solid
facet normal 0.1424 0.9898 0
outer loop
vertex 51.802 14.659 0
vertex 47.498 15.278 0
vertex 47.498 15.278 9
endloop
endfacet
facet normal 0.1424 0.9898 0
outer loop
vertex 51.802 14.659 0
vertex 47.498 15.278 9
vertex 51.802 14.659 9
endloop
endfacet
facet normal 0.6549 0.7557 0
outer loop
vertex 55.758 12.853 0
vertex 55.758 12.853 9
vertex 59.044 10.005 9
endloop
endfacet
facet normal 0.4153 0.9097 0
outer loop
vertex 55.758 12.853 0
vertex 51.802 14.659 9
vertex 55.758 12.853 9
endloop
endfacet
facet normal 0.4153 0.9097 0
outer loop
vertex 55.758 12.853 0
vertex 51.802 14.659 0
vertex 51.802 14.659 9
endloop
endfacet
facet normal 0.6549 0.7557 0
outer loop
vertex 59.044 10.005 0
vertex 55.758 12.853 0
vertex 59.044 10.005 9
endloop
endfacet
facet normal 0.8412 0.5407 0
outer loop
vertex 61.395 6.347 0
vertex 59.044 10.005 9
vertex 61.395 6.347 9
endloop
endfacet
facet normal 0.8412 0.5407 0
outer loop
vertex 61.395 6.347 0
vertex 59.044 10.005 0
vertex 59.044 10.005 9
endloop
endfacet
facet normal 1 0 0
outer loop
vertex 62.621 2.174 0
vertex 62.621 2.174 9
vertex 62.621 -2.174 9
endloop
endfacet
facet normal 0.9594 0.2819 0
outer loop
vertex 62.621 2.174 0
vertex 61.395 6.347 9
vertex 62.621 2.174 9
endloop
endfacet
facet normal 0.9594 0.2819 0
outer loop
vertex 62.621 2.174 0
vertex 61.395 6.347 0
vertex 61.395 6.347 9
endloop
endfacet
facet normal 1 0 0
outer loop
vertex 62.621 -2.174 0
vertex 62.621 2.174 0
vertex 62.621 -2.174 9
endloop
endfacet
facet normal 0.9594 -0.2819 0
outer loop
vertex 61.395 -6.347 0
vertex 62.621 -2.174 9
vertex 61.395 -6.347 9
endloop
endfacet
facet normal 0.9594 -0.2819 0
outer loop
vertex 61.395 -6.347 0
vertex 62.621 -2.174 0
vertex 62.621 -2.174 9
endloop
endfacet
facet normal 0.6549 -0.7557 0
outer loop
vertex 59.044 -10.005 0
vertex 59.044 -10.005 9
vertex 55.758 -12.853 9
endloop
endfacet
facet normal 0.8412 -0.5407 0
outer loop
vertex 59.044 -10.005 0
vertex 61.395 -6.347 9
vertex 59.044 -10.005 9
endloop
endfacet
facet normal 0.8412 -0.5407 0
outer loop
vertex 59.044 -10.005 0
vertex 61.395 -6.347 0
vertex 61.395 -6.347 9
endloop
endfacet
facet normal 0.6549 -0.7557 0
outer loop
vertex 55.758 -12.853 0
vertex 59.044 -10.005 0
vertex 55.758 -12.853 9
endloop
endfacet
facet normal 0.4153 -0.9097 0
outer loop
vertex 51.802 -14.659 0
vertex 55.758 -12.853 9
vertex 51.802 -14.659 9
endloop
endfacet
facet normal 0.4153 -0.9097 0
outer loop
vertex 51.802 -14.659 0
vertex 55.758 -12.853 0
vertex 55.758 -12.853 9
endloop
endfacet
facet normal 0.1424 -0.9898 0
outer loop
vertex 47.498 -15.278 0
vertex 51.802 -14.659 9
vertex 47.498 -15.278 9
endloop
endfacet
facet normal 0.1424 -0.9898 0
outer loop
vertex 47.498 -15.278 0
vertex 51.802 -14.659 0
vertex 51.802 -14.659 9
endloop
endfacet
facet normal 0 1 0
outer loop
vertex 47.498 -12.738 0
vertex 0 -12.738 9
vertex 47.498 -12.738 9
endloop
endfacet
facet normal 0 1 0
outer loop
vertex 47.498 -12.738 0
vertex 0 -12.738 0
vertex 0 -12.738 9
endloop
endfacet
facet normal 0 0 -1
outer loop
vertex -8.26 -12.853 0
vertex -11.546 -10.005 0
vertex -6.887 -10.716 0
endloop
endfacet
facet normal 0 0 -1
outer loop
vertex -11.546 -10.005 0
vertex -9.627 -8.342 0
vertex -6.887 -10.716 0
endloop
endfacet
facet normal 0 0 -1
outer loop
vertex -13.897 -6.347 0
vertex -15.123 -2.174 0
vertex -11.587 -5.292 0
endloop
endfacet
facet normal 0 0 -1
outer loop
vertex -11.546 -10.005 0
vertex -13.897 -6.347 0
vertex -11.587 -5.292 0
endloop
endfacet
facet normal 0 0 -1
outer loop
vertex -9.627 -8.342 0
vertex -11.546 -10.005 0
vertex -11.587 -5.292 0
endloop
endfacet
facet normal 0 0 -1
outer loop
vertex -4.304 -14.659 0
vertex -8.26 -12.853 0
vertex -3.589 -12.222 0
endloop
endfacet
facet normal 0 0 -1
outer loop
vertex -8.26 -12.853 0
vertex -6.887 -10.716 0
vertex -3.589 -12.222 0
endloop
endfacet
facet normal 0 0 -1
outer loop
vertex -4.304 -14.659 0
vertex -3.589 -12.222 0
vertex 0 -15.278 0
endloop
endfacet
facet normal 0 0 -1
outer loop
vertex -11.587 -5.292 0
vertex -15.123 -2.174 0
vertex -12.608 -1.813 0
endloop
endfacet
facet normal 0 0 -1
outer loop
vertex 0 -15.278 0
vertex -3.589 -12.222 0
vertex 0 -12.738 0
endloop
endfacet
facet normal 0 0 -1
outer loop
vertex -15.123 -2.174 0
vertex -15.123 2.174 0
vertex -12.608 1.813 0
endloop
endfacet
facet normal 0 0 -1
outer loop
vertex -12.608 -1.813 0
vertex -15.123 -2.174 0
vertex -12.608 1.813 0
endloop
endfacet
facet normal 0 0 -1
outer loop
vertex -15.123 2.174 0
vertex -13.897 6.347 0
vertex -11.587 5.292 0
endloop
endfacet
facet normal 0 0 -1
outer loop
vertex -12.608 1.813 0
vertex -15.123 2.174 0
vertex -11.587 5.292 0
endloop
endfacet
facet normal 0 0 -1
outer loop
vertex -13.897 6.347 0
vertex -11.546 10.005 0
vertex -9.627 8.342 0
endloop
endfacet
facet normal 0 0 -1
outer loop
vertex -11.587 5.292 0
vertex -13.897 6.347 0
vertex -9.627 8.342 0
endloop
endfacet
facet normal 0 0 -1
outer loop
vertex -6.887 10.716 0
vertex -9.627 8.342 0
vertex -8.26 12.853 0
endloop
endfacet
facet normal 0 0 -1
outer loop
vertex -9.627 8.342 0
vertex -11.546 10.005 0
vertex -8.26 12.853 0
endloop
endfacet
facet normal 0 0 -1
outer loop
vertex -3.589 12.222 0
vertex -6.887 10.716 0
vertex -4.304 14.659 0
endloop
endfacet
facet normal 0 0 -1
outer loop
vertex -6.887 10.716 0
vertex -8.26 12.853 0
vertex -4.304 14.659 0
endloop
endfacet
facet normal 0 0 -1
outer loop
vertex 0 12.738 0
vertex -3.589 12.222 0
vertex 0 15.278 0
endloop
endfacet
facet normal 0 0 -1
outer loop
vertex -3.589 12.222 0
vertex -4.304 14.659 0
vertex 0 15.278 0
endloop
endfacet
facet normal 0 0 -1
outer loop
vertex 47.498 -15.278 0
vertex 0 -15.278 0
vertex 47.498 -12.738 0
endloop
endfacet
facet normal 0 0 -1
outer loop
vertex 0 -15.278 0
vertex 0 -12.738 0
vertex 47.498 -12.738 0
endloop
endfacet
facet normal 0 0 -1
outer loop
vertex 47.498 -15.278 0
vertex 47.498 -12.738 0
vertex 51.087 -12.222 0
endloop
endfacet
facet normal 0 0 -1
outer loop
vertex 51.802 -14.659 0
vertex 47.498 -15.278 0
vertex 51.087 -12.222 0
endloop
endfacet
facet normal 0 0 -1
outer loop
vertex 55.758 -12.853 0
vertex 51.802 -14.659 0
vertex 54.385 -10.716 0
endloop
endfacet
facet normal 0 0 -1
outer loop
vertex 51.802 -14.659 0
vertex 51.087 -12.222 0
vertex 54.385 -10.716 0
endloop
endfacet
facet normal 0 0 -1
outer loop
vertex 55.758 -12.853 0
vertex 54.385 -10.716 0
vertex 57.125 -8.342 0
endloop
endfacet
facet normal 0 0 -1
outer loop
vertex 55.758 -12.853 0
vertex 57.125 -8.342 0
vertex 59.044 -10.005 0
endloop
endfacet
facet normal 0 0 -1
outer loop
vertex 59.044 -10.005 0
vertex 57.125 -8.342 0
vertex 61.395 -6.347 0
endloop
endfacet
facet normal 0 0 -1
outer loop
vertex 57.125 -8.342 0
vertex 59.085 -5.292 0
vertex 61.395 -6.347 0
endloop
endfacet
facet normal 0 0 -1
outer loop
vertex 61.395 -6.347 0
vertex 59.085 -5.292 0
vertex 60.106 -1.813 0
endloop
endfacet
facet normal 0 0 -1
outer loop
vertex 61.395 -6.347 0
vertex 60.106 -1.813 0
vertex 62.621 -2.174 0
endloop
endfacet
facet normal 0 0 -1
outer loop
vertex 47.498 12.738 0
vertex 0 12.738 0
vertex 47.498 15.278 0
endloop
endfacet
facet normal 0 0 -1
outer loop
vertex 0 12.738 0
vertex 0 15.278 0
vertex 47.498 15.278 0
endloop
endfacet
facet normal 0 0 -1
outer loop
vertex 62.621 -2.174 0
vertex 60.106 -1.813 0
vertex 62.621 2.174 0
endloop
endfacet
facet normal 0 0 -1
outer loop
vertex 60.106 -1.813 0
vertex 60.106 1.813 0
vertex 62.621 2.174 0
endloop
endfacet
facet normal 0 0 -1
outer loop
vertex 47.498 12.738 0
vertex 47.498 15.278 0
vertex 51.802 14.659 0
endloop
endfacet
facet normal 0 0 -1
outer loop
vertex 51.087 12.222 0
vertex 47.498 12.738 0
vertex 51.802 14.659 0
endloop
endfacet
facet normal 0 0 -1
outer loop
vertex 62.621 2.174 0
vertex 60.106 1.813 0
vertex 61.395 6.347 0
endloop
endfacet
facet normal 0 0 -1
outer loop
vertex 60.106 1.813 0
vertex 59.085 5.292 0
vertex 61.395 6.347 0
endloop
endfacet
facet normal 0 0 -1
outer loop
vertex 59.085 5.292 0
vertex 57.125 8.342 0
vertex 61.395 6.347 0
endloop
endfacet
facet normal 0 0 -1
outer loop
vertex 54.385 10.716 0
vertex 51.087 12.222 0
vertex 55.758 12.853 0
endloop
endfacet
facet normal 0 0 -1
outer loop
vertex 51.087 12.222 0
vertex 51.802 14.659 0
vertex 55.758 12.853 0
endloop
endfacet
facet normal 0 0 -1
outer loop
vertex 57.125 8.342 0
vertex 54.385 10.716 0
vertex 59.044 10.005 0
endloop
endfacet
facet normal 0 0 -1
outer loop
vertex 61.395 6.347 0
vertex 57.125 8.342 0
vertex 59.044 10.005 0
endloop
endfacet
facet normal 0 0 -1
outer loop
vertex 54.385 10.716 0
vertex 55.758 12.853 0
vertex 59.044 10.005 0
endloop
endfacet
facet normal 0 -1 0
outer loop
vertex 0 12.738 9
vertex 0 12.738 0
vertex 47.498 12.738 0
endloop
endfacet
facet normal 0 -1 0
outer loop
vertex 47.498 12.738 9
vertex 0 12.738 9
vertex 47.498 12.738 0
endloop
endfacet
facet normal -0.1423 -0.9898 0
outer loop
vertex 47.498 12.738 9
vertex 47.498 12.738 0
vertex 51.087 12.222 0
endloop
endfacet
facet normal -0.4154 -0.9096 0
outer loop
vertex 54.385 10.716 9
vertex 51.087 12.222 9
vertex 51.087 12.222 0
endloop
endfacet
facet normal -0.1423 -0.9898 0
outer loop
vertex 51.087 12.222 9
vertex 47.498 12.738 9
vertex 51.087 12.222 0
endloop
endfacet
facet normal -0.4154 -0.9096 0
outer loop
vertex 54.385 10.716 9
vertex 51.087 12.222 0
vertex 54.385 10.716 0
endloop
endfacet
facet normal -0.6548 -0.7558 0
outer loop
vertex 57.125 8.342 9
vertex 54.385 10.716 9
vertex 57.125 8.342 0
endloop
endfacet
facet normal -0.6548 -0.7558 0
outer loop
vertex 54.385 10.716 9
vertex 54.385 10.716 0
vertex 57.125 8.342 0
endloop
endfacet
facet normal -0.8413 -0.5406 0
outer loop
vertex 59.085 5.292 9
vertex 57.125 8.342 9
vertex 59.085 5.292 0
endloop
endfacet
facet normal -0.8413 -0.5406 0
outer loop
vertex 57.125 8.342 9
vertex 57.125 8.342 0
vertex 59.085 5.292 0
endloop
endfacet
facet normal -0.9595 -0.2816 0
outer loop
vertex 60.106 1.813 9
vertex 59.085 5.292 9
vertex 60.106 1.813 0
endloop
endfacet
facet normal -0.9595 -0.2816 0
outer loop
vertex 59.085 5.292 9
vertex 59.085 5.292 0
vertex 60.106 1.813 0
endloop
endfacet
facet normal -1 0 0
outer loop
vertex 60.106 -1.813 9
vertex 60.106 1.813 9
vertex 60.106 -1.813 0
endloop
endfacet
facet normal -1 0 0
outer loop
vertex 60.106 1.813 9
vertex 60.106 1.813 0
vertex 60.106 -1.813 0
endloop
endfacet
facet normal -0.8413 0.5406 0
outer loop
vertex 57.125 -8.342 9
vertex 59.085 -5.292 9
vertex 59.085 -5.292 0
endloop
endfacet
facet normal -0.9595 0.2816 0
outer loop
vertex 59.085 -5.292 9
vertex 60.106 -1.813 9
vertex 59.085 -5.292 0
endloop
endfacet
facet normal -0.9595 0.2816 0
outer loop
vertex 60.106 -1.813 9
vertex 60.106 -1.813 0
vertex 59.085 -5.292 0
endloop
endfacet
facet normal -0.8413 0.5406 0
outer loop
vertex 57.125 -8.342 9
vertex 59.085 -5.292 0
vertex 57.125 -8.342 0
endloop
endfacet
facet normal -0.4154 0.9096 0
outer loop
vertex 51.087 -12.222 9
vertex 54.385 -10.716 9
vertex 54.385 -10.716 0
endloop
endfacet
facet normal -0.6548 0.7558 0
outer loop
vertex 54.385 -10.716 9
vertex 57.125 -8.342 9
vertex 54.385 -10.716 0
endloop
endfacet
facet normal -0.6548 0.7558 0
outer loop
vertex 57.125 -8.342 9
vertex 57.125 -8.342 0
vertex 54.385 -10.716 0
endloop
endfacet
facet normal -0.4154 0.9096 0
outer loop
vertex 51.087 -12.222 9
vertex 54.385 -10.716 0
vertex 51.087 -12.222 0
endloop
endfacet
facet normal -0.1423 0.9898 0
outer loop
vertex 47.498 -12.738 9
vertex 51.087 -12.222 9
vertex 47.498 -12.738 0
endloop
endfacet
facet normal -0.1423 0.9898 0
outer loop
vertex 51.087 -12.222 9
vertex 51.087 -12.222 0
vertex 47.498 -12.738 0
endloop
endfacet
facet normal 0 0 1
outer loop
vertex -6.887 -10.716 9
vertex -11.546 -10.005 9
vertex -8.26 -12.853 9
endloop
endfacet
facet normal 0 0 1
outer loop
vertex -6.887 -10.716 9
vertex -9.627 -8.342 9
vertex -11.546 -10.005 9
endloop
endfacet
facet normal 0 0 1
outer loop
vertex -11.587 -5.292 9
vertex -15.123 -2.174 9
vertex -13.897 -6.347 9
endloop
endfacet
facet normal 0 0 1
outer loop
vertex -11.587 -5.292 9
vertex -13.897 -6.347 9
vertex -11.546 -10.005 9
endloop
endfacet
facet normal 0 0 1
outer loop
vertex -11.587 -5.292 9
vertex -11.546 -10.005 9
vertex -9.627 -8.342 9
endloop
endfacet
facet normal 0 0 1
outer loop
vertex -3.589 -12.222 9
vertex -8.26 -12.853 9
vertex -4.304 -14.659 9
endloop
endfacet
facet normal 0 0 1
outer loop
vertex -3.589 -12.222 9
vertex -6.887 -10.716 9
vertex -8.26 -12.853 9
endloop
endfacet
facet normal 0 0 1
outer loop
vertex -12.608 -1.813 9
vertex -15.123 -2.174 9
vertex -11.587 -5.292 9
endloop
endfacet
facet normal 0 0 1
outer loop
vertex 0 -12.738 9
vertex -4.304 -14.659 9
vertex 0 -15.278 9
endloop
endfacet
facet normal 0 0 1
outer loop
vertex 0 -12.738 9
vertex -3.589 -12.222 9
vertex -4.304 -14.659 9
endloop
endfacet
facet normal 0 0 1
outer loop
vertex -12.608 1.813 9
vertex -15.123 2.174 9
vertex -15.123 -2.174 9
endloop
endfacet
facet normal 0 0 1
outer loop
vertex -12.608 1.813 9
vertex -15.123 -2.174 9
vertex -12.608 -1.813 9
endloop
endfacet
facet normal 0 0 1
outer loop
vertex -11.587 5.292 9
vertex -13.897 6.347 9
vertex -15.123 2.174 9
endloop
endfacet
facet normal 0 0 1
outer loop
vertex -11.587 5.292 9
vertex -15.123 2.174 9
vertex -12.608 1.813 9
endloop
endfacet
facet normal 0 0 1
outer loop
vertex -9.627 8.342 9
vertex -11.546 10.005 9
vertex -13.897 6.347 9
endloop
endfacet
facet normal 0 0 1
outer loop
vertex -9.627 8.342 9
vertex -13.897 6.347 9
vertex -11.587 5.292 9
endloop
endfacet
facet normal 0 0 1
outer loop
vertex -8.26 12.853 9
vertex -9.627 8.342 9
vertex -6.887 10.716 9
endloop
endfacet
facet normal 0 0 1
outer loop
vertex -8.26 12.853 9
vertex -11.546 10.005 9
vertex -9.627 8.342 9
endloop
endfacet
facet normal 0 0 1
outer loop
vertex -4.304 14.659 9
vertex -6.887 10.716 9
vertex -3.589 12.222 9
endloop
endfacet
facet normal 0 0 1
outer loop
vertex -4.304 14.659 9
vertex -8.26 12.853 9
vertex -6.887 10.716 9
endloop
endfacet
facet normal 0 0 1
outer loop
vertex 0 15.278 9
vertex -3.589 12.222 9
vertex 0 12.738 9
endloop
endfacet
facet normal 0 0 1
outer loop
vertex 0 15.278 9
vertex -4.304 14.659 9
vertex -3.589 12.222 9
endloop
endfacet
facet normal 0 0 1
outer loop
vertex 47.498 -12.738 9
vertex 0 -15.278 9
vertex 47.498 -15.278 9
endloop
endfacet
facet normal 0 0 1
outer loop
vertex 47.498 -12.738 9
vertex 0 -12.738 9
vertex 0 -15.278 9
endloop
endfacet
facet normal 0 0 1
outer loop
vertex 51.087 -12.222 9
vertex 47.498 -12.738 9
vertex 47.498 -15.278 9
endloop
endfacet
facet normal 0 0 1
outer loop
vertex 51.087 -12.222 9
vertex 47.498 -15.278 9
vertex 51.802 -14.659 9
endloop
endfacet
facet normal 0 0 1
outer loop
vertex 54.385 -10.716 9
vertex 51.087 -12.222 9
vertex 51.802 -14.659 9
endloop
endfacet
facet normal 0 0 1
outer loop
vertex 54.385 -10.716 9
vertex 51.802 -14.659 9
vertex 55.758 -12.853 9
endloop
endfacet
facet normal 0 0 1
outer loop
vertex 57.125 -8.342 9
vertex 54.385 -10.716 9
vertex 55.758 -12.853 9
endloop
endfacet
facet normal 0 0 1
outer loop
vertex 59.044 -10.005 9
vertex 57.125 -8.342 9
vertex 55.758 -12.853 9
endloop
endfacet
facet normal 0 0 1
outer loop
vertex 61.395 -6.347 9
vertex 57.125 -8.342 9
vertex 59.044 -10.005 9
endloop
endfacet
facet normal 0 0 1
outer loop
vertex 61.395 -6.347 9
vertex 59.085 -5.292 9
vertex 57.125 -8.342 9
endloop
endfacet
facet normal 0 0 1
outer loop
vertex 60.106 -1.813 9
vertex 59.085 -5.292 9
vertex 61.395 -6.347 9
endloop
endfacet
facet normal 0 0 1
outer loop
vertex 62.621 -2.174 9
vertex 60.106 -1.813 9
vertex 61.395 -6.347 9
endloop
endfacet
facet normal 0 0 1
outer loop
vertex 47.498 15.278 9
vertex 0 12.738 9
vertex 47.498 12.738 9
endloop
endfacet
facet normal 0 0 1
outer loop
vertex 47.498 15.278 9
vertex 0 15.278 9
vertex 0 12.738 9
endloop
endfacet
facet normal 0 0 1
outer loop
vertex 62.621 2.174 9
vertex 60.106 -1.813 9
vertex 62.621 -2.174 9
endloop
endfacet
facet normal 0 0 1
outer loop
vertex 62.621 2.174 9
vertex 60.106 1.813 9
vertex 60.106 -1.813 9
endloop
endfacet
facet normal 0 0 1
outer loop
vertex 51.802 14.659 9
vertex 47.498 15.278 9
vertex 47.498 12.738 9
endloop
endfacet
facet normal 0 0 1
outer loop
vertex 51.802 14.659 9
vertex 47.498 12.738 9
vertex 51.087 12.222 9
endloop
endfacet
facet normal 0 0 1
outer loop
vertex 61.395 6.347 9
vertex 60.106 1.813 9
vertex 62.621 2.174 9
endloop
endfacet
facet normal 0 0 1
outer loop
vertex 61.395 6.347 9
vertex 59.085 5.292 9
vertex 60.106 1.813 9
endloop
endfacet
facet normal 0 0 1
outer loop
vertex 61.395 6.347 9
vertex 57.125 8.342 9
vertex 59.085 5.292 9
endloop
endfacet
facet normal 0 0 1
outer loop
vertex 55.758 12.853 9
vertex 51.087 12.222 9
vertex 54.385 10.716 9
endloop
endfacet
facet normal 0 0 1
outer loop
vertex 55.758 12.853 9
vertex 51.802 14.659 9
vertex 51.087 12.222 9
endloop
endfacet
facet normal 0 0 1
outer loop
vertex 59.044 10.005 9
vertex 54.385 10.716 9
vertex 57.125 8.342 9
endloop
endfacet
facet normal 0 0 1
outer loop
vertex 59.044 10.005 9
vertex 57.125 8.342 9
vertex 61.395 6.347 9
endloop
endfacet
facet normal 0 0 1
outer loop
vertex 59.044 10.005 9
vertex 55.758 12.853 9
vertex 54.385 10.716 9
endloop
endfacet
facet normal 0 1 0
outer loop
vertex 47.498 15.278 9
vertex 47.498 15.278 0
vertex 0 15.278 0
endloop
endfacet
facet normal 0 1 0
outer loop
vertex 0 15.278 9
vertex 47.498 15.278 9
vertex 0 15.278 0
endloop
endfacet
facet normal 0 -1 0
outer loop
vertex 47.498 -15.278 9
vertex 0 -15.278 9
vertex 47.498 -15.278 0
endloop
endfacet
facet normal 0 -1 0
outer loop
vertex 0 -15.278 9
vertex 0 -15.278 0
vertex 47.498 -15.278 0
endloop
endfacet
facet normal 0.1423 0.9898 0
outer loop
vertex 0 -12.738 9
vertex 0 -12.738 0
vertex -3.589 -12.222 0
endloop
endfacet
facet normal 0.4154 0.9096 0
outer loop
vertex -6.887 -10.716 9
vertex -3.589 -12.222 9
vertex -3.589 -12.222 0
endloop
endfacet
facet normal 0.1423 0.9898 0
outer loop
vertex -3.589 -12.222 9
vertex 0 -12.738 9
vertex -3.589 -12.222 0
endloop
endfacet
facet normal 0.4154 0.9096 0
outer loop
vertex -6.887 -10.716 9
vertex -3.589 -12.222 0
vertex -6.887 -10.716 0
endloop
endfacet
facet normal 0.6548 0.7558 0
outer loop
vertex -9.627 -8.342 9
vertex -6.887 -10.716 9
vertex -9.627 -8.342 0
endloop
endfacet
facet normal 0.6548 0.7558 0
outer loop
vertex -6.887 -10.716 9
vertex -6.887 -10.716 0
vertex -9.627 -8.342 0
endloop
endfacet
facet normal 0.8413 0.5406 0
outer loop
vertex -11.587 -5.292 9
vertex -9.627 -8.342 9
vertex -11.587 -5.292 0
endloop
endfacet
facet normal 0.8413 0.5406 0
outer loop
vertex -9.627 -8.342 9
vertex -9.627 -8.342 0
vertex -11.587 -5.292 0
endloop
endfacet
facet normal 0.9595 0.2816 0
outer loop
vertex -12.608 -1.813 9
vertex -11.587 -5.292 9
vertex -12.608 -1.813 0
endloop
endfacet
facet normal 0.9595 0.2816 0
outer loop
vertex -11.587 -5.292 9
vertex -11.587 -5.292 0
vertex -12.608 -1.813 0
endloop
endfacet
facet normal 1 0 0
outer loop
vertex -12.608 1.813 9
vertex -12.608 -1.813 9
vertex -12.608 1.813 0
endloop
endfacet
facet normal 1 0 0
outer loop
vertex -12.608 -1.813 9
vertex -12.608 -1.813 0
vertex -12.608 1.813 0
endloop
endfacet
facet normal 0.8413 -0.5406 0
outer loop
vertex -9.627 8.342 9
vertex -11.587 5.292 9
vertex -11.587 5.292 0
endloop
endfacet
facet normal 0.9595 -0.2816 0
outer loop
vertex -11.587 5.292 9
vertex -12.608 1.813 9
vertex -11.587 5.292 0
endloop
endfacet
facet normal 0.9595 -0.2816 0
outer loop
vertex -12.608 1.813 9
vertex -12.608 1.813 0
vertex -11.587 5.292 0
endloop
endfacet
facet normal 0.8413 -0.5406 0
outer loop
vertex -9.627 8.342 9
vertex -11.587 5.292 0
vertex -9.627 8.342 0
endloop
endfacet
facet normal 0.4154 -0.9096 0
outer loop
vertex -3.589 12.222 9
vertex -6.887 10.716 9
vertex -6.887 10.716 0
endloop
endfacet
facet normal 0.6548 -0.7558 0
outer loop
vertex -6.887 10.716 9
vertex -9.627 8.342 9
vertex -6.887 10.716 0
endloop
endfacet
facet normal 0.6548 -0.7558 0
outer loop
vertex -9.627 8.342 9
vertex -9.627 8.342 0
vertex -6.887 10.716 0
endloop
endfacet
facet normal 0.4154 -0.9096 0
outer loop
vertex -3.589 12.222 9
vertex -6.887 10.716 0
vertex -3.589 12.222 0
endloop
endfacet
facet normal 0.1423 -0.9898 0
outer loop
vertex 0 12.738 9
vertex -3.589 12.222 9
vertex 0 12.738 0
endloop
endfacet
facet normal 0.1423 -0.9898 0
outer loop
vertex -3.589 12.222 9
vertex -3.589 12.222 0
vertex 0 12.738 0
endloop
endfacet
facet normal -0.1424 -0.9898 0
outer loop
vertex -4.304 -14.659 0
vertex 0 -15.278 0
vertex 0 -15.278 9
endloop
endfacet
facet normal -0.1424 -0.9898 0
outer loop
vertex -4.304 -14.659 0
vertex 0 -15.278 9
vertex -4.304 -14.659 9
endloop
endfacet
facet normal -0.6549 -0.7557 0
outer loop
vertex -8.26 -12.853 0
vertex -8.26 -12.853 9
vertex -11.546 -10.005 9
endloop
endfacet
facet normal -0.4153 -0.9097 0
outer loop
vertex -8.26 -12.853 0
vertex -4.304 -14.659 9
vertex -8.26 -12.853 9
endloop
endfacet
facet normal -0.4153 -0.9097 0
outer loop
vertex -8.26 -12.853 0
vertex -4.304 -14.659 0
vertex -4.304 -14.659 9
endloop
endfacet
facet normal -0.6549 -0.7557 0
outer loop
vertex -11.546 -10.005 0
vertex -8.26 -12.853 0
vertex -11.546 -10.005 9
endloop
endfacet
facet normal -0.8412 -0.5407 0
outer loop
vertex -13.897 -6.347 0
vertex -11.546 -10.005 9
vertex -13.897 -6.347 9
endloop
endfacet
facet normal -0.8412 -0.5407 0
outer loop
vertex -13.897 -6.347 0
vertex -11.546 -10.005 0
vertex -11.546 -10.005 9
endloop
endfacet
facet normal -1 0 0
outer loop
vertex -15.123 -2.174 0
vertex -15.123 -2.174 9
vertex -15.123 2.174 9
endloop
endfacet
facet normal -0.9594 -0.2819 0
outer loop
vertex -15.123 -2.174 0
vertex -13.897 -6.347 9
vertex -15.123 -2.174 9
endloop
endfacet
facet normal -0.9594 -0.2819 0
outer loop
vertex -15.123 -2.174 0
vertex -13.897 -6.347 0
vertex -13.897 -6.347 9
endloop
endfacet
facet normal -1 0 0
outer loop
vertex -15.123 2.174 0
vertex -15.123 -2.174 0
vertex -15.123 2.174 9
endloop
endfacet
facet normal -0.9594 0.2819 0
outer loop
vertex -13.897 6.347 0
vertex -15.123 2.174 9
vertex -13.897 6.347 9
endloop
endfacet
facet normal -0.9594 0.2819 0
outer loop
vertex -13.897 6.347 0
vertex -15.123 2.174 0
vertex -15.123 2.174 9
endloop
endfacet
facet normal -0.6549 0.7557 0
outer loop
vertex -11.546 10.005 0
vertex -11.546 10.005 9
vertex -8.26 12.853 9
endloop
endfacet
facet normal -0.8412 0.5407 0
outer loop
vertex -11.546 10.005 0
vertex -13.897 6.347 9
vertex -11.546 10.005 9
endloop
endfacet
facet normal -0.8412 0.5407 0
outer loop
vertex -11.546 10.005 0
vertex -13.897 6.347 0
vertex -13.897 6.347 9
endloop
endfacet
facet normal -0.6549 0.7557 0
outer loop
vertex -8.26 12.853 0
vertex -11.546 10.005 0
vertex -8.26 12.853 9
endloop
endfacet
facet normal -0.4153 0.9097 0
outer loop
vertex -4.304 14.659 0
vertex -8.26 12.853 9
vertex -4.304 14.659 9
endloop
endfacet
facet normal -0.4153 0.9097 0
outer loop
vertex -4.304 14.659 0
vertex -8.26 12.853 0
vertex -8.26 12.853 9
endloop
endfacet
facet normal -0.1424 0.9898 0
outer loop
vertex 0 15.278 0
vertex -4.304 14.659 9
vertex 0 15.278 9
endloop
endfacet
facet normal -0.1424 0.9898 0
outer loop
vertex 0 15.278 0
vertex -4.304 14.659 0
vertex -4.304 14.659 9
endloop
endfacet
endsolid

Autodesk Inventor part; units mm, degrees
ref_plane "YZ Plane" through (0, 0, 0) normal (1, 0, 0) x (0, 1, 0)
ref_plane "XZ Plane" through (0, 0, 0) normal (0, 1, 0) x (-1, 0, 0)
ref_plane "XY Plane" through (0, 0, 0) normal (0, 0, 1) x (1, 0, 0)
sketch "Sketch1" plane through (0, 0, 0) normal (0, 0, 1) x (1, 0, 0)
  arc A0 (0, 12.7381) -> (0, -12.7381) centre (0, 0) ccw
  arc A1 (47.498, -12.7381) -> (47.498, 12.7381) centre (47.498, 0) ccw
  line L0 (0, 12.7381) -> (47.498, 12.7381)
  line L1 (0, -12.7381) -> (47.498, -12.7381)
  line L2 (47.498, 15.2781) -> (0, 15.2781)
  arc A2 (0, 15.2781) -> (0, -15.2781) centre (0, 0) ccw
  line L3 (0, -15.2781) -> (47.498, -15.2781)
  arc A3 (47.498, -15.2781) -> (47.498, 15.2781) centre (47.498, 0) ccw
  dimension "d0" = 25.4762
  dimension "d1" = 47.498
  dimension "d2" = 2.54
extrude "Extrusion1" add sketch "Sketch1" along normal blind 9
properties part number "INDX_020_MiniFeederBelt" material "Rubber"
